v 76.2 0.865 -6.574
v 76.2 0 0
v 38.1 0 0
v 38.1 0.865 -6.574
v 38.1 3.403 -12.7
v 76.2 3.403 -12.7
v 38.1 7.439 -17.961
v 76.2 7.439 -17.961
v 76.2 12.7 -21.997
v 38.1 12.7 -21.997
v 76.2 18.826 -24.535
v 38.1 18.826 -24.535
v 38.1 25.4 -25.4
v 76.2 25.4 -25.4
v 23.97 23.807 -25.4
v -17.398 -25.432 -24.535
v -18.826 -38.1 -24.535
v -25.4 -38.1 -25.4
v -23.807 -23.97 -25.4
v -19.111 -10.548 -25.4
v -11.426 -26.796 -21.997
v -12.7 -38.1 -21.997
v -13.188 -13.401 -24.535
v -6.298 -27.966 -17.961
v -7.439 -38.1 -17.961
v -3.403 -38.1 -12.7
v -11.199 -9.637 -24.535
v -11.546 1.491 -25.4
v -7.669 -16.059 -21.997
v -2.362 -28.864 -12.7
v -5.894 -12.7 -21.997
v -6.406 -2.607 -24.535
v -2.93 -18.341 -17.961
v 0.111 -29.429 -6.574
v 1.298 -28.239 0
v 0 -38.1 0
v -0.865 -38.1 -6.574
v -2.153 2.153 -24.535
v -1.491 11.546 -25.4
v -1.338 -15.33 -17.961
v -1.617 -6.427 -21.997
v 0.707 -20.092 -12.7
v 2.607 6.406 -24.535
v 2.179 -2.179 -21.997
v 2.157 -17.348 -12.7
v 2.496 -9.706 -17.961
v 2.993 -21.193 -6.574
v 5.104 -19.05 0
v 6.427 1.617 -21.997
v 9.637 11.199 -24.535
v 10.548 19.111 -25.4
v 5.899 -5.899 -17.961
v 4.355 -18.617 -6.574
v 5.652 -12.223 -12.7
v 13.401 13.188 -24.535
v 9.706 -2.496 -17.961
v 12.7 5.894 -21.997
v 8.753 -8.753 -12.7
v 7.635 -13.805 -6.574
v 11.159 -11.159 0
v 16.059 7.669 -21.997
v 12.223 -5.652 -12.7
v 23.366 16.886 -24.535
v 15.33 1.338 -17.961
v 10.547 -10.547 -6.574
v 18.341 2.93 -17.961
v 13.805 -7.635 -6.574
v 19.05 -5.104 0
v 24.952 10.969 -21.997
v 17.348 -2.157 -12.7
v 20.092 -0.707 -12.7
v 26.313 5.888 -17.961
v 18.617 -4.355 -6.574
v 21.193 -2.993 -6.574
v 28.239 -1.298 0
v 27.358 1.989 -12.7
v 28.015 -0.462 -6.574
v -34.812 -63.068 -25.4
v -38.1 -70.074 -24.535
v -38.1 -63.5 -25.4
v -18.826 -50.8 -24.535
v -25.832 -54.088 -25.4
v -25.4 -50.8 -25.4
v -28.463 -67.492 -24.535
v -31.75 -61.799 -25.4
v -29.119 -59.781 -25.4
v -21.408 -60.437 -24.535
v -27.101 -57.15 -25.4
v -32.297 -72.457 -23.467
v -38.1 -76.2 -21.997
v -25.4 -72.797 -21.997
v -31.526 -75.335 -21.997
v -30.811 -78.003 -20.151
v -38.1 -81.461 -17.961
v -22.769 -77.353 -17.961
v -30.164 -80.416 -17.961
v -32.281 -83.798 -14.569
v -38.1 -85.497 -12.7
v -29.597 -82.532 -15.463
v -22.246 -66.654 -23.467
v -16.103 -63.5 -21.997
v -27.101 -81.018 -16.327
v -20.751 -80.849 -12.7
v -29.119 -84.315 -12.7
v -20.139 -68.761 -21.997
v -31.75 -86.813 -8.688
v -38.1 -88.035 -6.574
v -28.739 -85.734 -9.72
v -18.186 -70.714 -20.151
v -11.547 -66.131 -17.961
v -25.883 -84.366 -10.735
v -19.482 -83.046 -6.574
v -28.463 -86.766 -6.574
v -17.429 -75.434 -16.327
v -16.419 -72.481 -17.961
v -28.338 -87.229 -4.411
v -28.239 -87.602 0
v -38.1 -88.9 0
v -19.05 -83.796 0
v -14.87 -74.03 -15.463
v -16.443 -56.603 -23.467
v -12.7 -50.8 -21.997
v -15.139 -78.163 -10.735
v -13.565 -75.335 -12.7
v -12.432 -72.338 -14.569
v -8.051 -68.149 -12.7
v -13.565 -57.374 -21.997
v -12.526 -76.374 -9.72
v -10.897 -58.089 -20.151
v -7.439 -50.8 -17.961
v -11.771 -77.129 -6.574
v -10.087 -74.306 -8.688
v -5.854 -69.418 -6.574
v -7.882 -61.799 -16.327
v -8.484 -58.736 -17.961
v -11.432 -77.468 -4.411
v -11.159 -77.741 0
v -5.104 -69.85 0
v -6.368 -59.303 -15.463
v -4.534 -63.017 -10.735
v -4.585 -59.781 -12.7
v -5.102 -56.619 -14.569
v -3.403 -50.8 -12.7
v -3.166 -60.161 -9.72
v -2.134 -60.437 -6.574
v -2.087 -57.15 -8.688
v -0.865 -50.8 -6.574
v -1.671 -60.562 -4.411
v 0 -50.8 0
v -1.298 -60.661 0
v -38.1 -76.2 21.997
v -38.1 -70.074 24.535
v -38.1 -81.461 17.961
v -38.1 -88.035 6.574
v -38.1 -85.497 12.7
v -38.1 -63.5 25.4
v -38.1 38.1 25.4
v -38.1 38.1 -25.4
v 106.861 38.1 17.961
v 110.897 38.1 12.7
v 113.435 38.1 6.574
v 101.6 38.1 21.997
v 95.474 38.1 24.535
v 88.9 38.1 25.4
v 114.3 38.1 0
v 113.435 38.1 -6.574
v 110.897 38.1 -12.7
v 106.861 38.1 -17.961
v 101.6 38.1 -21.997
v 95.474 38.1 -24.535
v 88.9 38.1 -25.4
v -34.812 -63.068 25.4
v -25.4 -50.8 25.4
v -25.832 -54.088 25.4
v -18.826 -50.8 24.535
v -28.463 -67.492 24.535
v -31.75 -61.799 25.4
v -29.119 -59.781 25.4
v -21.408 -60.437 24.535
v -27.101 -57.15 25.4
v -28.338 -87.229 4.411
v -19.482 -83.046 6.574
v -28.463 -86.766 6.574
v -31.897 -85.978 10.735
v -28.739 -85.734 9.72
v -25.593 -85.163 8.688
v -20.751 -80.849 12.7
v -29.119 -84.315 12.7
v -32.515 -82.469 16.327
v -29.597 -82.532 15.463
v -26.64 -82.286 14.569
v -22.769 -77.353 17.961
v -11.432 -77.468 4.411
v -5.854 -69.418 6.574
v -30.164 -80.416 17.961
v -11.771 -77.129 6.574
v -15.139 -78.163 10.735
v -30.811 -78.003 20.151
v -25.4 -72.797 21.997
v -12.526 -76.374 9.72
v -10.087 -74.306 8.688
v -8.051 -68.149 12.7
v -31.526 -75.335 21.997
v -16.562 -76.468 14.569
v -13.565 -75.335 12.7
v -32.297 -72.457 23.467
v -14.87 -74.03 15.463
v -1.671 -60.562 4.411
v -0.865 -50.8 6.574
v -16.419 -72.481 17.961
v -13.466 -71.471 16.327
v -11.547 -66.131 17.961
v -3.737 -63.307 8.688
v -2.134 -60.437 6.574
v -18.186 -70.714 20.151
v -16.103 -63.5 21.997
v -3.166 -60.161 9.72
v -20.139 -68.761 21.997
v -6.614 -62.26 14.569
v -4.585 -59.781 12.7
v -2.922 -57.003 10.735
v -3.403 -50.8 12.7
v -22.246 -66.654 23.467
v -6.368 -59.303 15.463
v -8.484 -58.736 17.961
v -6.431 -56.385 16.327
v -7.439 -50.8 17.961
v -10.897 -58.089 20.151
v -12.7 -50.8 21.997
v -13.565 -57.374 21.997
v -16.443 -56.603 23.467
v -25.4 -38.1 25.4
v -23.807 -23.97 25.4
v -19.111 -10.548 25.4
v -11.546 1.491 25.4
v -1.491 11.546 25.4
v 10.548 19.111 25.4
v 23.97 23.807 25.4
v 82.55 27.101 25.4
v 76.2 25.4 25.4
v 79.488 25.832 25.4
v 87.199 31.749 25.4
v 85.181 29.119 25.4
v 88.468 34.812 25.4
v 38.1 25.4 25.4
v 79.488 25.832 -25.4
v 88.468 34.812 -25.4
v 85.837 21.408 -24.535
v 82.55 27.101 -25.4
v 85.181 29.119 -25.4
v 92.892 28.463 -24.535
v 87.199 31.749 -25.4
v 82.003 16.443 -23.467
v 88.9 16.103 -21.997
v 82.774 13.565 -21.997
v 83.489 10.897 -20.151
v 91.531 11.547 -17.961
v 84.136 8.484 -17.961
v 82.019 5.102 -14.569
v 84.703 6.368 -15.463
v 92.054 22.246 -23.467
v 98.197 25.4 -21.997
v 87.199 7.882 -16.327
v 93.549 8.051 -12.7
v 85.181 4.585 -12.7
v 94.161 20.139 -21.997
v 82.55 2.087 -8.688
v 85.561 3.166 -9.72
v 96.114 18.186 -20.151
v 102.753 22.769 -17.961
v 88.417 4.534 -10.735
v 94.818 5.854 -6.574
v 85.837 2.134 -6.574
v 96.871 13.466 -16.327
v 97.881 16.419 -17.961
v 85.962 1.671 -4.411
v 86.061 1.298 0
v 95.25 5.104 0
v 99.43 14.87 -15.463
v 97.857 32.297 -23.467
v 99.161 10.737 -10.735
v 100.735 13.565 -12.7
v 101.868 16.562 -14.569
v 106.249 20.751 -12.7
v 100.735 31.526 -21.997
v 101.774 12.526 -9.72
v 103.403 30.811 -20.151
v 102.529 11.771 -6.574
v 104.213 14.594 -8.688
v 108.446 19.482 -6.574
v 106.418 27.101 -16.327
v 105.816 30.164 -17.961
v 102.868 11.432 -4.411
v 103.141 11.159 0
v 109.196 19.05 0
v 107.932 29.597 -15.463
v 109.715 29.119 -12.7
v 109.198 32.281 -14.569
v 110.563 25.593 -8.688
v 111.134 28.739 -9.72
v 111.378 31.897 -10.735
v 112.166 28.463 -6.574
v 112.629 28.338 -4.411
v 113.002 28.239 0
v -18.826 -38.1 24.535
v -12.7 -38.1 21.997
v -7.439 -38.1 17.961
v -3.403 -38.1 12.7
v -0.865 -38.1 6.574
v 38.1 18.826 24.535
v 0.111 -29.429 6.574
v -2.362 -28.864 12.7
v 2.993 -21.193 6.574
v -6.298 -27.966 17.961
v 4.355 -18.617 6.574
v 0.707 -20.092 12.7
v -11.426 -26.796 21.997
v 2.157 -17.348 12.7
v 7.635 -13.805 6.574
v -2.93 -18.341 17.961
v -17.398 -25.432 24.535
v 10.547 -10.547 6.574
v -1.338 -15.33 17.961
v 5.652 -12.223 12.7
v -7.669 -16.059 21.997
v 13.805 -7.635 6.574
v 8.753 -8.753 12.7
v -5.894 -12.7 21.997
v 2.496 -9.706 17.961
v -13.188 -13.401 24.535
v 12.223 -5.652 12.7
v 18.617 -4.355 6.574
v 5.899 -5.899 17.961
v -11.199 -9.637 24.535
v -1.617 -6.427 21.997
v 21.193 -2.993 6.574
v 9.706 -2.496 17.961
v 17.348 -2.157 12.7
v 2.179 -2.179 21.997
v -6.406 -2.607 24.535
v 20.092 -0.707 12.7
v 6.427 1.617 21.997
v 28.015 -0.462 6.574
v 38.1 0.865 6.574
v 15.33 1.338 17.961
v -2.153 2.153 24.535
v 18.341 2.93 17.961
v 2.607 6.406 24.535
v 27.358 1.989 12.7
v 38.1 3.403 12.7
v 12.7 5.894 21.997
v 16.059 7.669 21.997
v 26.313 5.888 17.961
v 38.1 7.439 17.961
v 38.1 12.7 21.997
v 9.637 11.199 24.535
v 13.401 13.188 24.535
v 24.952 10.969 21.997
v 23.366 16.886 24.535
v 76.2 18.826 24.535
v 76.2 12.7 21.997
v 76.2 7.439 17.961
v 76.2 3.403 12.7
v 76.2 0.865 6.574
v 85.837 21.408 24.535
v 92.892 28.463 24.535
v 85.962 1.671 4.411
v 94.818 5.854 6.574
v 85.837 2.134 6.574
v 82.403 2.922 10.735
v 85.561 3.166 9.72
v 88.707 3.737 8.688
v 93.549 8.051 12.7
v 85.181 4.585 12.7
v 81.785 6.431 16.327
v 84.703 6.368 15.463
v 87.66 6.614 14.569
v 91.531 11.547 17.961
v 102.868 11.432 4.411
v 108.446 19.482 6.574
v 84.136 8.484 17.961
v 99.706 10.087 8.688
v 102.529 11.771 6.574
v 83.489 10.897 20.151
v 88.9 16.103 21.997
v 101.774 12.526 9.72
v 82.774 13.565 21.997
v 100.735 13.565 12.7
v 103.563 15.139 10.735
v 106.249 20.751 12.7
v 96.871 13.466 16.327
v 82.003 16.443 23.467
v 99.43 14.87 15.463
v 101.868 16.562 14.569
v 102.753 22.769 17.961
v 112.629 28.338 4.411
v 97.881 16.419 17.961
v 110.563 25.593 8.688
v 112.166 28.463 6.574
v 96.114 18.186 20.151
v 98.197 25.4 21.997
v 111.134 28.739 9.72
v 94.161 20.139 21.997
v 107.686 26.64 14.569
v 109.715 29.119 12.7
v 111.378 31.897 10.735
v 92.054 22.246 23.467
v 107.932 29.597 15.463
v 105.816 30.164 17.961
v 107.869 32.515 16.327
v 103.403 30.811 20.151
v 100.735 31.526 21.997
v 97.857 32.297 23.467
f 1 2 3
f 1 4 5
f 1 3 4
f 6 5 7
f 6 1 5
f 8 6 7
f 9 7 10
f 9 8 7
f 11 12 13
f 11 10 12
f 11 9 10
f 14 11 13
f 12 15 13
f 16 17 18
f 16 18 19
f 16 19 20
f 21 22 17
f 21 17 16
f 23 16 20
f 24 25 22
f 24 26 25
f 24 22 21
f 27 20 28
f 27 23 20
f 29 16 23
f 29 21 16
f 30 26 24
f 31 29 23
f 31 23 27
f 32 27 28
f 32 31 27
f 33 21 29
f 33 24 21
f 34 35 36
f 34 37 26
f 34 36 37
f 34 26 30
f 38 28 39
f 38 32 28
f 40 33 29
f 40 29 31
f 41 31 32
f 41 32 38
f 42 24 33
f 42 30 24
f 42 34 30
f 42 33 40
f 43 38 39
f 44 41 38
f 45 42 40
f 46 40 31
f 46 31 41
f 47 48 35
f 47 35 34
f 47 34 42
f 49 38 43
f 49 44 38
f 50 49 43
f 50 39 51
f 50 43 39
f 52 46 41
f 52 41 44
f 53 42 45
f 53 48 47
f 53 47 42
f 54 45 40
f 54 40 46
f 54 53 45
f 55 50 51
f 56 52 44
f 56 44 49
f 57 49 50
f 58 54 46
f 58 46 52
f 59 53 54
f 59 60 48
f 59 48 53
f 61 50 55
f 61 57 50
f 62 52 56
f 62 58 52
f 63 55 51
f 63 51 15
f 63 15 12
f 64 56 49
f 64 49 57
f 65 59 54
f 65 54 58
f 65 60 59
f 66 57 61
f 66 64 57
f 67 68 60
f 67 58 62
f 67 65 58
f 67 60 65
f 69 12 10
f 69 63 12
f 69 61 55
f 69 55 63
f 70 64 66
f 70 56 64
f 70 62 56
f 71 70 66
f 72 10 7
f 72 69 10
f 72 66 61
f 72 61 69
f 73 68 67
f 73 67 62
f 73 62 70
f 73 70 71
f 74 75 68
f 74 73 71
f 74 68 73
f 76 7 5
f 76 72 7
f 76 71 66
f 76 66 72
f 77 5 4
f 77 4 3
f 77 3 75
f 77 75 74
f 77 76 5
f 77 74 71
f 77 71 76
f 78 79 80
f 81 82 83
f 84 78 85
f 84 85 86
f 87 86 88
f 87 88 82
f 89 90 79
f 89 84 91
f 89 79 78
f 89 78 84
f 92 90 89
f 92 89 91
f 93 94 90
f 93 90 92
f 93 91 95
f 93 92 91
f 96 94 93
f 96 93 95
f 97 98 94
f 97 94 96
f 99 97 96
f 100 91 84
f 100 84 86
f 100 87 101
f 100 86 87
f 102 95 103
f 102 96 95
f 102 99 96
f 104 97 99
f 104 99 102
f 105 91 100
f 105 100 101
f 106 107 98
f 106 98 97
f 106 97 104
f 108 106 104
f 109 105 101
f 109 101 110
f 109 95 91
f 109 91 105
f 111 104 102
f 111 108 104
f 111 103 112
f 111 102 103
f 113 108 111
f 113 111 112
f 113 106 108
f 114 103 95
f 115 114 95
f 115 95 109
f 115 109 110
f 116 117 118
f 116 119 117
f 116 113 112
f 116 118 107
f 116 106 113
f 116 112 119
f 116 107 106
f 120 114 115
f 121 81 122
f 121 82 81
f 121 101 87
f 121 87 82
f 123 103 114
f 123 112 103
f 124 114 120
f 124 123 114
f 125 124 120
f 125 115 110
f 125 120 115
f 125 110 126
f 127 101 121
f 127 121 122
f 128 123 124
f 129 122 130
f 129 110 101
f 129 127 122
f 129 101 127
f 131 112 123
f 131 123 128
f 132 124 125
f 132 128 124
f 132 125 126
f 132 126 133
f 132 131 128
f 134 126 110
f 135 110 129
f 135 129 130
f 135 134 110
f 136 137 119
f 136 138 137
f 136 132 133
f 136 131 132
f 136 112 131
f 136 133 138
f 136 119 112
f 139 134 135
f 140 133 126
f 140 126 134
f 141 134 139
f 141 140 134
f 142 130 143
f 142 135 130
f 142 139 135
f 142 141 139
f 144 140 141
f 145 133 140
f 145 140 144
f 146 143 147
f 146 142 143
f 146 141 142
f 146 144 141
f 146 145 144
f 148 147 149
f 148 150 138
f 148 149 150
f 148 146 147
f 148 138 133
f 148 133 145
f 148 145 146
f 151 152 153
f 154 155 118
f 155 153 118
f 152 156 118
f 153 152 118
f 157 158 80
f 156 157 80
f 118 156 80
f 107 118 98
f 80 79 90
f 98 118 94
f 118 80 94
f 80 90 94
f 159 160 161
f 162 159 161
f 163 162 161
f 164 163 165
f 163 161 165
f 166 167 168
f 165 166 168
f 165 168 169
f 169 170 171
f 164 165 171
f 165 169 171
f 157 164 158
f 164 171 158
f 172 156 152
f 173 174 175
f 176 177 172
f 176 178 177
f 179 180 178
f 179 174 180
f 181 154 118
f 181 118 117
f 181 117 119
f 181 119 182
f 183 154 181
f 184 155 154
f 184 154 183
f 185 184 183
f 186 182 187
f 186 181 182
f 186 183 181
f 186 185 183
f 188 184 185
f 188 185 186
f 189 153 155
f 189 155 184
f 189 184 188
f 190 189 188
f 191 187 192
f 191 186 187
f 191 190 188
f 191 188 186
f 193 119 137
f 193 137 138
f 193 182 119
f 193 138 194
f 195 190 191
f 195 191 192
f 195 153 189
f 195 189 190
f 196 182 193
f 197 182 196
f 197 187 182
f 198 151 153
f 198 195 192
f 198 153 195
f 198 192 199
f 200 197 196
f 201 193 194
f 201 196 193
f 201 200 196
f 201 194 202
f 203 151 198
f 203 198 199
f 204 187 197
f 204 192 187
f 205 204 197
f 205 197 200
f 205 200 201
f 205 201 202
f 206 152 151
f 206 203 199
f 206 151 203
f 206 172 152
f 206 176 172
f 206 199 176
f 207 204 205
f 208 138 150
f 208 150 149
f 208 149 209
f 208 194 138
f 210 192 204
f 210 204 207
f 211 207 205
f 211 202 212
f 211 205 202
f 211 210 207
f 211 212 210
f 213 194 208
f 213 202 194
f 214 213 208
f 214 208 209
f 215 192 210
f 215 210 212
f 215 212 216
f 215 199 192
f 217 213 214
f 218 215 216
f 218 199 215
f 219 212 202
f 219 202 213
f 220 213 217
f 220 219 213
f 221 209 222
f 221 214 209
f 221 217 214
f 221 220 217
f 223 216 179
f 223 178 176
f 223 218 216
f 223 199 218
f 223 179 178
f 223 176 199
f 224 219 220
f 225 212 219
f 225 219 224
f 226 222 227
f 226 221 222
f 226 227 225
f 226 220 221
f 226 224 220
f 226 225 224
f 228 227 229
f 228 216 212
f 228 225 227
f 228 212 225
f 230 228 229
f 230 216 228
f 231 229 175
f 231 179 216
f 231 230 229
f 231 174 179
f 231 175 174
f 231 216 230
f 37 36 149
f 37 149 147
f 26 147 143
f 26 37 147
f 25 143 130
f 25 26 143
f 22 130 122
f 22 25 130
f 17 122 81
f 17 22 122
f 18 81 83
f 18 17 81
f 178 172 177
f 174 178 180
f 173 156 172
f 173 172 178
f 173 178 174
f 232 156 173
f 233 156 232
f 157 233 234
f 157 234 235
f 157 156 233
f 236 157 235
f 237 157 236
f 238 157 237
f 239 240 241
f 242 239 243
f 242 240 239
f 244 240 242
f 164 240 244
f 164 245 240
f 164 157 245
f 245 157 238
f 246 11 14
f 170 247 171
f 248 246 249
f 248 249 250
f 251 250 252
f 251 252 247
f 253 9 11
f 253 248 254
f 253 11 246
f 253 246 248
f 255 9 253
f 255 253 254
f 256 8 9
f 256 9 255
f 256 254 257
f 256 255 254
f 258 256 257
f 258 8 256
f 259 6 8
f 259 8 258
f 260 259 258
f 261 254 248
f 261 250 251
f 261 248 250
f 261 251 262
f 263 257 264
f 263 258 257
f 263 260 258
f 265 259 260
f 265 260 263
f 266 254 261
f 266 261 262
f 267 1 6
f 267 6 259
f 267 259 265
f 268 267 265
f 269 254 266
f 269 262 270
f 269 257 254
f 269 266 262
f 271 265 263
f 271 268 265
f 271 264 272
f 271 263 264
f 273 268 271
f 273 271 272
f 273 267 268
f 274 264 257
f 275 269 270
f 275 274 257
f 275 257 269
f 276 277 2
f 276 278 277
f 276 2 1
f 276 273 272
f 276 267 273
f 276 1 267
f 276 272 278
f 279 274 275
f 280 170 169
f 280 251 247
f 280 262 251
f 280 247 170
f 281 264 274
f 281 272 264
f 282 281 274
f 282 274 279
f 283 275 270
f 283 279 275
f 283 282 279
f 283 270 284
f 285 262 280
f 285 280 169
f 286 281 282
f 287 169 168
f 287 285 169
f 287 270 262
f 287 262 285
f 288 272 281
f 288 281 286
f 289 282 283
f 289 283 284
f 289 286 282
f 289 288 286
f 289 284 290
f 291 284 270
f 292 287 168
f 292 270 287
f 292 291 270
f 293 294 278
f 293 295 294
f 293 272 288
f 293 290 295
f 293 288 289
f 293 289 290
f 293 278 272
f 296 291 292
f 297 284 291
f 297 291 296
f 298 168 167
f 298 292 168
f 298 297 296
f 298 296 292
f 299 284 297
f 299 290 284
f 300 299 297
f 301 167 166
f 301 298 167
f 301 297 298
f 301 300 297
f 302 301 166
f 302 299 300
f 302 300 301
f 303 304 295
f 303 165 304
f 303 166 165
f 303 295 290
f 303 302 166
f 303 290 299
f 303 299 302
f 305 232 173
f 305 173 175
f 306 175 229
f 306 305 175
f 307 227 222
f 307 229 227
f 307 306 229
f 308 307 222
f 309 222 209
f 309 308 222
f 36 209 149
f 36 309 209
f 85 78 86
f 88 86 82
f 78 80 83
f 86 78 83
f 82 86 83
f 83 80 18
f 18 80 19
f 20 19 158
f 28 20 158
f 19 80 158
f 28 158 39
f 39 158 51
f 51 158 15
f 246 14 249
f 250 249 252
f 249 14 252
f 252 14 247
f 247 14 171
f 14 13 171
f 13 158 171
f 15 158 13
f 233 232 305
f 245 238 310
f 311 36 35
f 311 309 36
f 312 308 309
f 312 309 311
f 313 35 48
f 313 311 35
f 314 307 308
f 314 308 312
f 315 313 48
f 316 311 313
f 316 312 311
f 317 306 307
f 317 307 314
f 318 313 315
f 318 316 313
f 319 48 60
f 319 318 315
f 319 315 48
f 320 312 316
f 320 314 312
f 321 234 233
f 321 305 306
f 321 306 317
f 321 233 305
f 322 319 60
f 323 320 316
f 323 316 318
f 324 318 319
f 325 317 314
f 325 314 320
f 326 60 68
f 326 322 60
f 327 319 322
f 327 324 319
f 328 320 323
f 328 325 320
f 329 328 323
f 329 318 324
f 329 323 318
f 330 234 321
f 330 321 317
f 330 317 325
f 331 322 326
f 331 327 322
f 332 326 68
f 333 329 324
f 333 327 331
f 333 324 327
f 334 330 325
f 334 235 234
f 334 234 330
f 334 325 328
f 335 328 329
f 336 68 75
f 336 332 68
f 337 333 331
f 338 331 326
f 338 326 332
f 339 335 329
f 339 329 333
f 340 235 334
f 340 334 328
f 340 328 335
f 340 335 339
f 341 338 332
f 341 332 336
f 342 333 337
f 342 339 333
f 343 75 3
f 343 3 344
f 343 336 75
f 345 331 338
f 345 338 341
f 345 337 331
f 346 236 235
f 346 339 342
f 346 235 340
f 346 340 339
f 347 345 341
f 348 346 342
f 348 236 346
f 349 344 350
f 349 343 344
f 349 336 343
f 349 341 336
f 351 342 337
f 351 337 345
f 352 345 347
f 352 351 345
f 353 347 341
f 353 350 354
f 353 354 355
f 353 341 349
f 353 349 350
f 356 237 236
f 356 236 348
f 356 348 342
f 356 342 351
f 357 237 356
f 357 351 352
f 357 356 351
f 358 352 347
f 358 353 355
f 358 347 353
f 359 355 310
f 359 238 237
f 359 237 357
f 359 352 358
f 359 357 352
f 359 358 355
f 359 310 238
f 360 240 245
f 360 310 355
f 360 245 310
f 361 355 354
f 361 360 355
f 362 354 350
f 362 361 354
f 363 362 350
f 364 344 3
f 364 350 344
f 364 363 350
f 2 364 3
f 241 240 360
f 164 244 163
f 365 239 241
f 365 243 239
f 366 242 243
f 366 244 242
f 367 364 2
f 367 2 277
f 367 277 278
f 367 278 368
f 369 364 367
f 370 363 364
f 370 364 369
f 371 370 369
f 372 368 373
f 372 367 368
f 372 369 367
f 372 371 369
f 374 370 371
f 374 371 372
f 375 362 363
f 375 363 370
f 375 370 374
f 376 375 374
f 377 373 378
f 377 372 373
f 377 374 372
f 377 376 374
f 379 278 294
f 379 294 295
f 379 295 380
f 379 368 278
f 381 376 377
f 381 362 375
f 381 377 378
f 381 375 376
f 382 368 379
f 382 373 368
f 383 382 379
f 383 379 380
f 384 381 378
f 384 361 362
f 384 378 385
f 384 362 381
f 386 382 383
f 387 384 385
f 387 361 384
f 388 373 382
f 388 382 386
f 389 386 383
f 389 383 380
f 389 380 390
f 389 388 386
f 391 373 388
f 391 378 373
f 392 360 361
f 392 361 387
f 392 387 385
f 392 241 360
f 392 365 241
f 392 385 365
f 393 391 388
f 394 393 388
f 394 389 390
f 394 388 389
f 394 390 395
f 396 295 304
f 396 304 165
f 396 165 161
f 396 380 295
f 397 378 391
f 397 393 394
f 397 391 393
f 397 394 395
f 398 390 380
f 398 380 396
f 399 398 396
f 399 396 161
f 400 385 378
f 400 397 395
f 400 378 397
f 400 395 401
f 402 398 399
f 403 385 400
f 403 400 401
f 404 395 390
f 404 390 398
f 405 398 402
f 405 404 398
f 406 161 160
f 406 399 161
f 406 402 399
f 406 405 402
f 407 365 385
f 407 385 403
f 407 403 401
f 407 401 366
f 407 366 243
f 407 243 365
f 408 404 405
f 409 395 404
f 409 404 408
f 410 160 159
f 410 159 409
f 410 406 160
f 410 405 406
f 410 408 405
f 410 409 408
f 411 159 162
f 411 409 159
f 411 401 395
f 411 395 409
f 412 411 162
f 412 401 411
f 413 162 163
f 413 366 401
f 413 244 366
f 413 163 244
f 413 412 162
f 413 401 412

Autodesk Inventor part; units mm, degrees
ref_plane "YZ Plane" through (0, 0, 0) normal (1, 0, 0) x (0, 1, 0)
ref_plane "XZ Plane" through (0, 0, 0) normal (0, 1, 0) x (-1, 0, 0)
ref_plane "XY Plane" through (0, 0, 0) normal (0, 0, 1) x (1, 0, 0)
sketch "Sketch1" plane through (0, 0, 0) normal (0, 0, 1) x (1, 0, 0)
  line L0 (0, 0) -> (114.3, 0)
  line L1 (114.3, 0) -> (114.3, 38.1)
  line L2 (114.3, 38.1) -> (-38.1, 38.1)
  line L3 (-38.1, 38.1) -> (-38.1, -88.9)
  line L4 (-38.1, -88.9) -> (0, -88.9)
  line L5 (0, -88.9) -> (0, 0)
  dimension "d0" = 152.4
  dimension "d1" = 127
  dimension "d2" = 38.1
  dimension "d3" = 38.1
extrude "Extrusion1" add sketch "Sketch1" along normal mid plane 50.8
fillet "Fillet1" radius 38.1 3 edges at (0, -88.9, 0) (114.3, 0, 0) (0, 0, 0)
fillet "Fillet2" radius 25.4 8 edges at (0, -44.45, 25.4) (-11.1591, -77.7409, 25.4) (57.15, 0, 25.4) (103.1409, 11.1591, 25.4) (57.15, 0, -25.4) (103.1409, 11.1591, -25.4) (-11.1591, -77.7409, -25.4) (0, -44.45, -25.4)
properties part number "shelfBracket"
